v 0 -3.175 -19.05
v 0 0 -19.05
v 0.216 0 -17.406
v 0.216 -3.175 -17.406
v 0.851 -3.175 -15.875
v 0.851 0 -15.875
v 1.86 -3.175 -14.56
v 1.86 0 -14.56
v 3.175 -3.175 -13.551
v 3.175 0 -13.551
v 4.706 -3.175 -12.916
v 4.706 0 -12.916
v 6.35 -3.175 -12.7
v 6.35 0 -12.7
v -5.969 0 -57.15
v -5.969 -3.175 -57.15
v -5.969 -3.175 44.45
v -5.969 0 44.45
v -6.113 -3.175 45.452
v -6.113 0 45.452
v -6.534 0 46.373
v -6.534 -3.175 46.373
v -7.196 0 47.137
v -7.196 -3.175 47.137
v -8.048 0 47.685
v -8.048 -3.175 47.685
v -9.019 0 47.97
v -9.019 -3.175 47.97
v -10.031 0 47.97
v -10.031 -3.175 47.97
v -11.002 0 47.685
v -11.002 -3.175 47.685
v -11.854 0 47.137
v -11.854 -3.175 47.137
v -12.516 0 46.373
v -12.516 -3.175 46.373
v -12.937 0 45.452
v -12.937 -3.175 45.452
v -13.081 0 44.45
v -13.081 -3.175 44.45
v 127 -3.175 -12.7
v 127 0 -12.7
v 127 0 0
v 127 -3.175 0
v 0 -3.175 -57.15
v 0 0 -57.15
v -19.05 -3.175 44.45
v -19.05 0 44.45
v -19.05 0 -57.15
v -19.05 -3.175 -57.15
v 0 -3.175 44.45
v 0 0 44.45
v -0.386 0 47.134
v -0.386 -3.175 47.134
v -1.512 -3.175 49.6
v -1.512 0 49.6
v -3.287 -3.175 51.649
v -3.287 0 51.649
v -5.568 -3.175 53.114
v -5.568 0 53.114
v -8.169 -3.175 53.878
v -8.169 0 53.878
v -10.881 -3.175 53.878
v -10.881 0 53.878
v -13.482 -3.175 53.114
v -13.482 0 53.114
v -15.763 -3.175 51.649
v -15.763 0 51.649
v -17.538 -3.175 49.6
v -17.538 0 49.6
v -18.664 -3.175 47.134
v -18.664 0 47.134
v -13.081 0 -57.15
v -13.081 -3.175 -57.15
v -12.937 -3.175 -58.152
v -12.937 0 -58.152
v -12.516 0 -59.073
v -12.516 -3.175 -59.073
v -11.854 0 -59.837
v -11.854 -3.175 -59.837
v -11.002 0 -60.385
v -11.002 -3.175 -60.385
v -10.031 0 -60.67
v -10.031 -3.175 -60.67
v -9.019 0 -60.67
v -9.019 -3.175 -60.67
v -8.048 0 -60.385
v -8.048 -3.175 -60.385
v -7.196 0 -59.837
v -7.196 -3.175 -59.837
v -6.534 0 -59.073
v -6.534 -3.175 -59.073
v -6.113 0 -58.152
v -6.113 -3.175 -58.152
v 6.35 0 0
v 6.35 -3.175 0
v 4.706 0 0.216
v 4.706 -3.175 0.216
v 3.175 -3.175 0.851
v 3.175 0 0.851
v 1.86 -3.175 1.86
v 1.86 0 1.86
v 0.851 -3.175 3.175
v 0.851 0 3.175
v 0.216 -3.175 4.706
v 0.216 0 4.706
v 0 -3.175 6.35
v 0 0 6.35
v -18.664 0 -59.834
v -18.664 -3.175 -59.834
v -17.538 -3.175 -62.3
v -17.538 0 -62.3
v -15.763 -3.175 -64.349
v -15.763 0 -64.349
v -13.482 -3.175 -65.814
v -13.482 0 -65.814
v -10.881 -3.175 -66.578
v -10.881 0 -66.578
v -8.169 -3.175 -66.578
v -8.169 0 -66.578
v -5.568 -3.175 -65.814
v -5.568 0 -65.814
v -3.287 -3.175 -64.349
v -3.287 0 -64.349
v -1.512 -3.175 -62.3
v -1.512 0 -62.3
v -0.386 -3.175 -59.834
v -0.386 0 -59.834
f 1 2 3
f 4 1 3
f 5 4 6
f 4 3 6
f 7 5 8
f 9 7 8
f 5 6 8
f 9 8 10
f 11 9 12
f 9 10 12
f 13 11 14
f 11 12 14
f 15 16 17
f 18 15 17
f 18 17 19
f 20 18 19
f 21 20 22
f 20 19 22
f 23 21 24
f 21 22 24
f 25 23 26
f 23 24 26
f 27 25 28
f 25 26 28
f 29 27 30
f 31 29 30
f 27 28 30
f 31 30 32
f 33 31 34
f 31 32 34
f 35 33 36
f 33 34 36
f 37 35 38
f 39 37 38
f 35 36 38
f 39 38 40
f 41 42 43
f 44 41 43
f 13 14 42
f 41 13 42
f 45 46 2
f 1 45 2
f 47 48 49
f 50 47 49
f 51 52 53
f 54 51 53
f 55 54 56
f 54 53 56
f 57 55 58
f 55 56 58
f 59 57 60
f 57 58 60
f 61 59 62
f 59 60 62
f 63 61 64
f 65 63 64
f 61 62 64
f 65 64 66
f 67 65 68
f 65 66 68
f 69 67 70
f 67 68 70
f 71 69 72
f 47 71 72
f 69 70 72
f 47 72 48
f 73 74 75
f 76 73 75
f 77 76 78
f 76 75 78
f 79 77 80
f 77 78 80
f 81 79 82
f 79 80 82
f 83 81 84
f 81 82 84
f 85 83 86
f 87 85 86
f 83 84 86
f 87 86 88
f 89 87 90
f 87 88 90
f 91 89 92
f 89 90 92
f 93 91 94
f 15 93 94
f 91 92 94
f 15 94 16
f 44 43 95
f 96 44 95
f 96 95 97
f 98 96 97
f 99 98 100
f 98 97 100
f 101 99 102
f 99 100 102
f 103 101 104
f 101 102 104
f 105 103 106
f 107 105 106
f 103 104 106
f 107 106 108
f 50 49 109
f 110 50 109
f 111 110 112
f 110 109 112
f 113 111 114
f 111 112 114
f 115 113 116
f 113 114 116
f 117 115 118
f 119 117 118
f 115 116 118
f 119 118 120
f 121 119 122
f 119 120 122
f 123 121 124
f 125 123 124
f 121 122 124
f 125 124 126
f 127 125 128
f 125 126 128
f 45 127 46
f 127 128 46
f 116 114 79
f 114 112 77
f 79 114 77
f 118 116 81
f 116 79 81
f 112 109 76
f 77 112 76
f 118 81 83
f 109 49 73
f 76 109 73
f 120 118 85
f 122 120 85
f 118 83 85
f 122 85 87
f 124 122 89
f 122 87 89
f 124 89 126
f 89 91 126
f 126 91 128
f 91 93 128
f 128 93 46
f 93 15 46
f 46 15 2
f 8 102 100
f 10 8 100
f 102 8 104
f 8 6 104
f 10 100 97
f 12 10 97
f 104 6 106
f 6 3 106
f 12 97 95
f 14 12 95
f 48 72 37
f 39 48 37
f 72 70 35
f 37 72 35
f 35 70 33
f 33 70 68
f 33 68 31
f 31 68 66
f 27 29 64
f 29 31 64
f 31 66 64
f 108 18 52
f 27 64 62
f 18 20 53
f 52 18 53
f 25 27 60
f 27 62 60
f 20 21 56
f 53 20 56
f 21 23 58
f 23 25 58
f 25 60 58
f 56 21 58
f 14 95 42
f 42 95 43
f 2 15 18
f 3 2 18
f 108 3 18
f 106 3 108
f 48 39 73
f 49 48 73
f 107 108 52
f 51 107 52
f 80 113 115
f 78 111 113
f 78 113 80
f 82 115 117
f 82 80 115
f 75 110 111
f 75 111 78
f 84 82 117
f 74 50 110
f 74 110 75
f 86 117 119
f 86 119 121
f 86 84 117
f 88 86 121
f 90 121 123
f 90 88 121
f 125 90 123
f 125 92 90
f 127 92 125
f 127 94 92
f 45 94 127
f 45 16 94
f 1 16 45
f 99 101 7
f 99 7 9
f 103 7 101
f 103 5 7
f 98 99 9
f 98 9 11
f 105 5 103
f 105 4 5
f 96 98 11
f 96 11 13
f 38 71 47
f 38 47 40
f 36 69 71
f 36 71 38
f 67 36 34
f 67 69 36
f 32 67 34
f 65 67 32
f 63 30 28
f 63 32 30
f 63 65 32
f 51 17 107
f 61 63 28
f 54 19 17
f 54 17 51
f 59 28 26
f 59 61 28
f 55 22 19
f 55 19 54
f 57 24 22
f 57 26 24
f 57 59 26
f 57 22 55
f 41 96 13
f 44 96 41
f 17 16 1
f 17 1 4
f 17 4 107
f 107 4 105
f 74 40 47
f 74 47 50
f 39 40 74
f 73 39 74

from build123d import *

# Parameters (mm, degrees)
F1_DEPTH = 3.175
F3_DEPTH = 25.4


with BuildPart() as f1:
    # F0 (on Front) → F1 (new body)
    with BuildSketch(Plane.XZ):
        with BuildLine():
            Line((127, 0), (6.35, 0))
            ThreePointArc((6.35, 0), (1.859872, 1.859872), (0, 6.35))
            Line((0, 6.35), (0, 44.45))
            ThreePointArc((0, 44.45), (-9.525, 53.975), (-19.05, 44.45))
            Line((-19.05, 44.45), (-19.05, -57.15))
            ThreePointArc((-19.05, -57.15), (-9.525, -66.675), (0, -57.15))
            Line((0, -57.15), (0, -19.05))
            ThreePointArc((0, -19.05), (1.859872, -14.559872), (6.35, -12.7))
            Line((6.35, -12.7), (127, -12.7))
            Line((127, -12.7), (127, 0))
        make_face()
    extrude(amount=F1_DEPTH)

    # F2 (on face) → F3 (cut)
    with BuildSketch(Plane.XZ.offset(3.175)):
        with BuildLine():
            Line((-5.969, 6.35), (-5.969, 44.45))
            ThreePointArc((-5.969, 44.45), (-9.525, 48.006), (-13.081, 44.45))
            Line((-13.081, 44.45), (-13.081, -57.15))
            ThreePointArc((-13.081, -57.15), (-9.525, -60.706), (-5.969, -57.15))
            Line((-5.969, -57.15), (-5.969, -19.05))
            Line((-5.969, -19.05), (-5.969, 6.35))
        make_face()
    extrude(amount=-F3_DEPTH, mode=Mode.SUBTRACT)


solid = f1.part
